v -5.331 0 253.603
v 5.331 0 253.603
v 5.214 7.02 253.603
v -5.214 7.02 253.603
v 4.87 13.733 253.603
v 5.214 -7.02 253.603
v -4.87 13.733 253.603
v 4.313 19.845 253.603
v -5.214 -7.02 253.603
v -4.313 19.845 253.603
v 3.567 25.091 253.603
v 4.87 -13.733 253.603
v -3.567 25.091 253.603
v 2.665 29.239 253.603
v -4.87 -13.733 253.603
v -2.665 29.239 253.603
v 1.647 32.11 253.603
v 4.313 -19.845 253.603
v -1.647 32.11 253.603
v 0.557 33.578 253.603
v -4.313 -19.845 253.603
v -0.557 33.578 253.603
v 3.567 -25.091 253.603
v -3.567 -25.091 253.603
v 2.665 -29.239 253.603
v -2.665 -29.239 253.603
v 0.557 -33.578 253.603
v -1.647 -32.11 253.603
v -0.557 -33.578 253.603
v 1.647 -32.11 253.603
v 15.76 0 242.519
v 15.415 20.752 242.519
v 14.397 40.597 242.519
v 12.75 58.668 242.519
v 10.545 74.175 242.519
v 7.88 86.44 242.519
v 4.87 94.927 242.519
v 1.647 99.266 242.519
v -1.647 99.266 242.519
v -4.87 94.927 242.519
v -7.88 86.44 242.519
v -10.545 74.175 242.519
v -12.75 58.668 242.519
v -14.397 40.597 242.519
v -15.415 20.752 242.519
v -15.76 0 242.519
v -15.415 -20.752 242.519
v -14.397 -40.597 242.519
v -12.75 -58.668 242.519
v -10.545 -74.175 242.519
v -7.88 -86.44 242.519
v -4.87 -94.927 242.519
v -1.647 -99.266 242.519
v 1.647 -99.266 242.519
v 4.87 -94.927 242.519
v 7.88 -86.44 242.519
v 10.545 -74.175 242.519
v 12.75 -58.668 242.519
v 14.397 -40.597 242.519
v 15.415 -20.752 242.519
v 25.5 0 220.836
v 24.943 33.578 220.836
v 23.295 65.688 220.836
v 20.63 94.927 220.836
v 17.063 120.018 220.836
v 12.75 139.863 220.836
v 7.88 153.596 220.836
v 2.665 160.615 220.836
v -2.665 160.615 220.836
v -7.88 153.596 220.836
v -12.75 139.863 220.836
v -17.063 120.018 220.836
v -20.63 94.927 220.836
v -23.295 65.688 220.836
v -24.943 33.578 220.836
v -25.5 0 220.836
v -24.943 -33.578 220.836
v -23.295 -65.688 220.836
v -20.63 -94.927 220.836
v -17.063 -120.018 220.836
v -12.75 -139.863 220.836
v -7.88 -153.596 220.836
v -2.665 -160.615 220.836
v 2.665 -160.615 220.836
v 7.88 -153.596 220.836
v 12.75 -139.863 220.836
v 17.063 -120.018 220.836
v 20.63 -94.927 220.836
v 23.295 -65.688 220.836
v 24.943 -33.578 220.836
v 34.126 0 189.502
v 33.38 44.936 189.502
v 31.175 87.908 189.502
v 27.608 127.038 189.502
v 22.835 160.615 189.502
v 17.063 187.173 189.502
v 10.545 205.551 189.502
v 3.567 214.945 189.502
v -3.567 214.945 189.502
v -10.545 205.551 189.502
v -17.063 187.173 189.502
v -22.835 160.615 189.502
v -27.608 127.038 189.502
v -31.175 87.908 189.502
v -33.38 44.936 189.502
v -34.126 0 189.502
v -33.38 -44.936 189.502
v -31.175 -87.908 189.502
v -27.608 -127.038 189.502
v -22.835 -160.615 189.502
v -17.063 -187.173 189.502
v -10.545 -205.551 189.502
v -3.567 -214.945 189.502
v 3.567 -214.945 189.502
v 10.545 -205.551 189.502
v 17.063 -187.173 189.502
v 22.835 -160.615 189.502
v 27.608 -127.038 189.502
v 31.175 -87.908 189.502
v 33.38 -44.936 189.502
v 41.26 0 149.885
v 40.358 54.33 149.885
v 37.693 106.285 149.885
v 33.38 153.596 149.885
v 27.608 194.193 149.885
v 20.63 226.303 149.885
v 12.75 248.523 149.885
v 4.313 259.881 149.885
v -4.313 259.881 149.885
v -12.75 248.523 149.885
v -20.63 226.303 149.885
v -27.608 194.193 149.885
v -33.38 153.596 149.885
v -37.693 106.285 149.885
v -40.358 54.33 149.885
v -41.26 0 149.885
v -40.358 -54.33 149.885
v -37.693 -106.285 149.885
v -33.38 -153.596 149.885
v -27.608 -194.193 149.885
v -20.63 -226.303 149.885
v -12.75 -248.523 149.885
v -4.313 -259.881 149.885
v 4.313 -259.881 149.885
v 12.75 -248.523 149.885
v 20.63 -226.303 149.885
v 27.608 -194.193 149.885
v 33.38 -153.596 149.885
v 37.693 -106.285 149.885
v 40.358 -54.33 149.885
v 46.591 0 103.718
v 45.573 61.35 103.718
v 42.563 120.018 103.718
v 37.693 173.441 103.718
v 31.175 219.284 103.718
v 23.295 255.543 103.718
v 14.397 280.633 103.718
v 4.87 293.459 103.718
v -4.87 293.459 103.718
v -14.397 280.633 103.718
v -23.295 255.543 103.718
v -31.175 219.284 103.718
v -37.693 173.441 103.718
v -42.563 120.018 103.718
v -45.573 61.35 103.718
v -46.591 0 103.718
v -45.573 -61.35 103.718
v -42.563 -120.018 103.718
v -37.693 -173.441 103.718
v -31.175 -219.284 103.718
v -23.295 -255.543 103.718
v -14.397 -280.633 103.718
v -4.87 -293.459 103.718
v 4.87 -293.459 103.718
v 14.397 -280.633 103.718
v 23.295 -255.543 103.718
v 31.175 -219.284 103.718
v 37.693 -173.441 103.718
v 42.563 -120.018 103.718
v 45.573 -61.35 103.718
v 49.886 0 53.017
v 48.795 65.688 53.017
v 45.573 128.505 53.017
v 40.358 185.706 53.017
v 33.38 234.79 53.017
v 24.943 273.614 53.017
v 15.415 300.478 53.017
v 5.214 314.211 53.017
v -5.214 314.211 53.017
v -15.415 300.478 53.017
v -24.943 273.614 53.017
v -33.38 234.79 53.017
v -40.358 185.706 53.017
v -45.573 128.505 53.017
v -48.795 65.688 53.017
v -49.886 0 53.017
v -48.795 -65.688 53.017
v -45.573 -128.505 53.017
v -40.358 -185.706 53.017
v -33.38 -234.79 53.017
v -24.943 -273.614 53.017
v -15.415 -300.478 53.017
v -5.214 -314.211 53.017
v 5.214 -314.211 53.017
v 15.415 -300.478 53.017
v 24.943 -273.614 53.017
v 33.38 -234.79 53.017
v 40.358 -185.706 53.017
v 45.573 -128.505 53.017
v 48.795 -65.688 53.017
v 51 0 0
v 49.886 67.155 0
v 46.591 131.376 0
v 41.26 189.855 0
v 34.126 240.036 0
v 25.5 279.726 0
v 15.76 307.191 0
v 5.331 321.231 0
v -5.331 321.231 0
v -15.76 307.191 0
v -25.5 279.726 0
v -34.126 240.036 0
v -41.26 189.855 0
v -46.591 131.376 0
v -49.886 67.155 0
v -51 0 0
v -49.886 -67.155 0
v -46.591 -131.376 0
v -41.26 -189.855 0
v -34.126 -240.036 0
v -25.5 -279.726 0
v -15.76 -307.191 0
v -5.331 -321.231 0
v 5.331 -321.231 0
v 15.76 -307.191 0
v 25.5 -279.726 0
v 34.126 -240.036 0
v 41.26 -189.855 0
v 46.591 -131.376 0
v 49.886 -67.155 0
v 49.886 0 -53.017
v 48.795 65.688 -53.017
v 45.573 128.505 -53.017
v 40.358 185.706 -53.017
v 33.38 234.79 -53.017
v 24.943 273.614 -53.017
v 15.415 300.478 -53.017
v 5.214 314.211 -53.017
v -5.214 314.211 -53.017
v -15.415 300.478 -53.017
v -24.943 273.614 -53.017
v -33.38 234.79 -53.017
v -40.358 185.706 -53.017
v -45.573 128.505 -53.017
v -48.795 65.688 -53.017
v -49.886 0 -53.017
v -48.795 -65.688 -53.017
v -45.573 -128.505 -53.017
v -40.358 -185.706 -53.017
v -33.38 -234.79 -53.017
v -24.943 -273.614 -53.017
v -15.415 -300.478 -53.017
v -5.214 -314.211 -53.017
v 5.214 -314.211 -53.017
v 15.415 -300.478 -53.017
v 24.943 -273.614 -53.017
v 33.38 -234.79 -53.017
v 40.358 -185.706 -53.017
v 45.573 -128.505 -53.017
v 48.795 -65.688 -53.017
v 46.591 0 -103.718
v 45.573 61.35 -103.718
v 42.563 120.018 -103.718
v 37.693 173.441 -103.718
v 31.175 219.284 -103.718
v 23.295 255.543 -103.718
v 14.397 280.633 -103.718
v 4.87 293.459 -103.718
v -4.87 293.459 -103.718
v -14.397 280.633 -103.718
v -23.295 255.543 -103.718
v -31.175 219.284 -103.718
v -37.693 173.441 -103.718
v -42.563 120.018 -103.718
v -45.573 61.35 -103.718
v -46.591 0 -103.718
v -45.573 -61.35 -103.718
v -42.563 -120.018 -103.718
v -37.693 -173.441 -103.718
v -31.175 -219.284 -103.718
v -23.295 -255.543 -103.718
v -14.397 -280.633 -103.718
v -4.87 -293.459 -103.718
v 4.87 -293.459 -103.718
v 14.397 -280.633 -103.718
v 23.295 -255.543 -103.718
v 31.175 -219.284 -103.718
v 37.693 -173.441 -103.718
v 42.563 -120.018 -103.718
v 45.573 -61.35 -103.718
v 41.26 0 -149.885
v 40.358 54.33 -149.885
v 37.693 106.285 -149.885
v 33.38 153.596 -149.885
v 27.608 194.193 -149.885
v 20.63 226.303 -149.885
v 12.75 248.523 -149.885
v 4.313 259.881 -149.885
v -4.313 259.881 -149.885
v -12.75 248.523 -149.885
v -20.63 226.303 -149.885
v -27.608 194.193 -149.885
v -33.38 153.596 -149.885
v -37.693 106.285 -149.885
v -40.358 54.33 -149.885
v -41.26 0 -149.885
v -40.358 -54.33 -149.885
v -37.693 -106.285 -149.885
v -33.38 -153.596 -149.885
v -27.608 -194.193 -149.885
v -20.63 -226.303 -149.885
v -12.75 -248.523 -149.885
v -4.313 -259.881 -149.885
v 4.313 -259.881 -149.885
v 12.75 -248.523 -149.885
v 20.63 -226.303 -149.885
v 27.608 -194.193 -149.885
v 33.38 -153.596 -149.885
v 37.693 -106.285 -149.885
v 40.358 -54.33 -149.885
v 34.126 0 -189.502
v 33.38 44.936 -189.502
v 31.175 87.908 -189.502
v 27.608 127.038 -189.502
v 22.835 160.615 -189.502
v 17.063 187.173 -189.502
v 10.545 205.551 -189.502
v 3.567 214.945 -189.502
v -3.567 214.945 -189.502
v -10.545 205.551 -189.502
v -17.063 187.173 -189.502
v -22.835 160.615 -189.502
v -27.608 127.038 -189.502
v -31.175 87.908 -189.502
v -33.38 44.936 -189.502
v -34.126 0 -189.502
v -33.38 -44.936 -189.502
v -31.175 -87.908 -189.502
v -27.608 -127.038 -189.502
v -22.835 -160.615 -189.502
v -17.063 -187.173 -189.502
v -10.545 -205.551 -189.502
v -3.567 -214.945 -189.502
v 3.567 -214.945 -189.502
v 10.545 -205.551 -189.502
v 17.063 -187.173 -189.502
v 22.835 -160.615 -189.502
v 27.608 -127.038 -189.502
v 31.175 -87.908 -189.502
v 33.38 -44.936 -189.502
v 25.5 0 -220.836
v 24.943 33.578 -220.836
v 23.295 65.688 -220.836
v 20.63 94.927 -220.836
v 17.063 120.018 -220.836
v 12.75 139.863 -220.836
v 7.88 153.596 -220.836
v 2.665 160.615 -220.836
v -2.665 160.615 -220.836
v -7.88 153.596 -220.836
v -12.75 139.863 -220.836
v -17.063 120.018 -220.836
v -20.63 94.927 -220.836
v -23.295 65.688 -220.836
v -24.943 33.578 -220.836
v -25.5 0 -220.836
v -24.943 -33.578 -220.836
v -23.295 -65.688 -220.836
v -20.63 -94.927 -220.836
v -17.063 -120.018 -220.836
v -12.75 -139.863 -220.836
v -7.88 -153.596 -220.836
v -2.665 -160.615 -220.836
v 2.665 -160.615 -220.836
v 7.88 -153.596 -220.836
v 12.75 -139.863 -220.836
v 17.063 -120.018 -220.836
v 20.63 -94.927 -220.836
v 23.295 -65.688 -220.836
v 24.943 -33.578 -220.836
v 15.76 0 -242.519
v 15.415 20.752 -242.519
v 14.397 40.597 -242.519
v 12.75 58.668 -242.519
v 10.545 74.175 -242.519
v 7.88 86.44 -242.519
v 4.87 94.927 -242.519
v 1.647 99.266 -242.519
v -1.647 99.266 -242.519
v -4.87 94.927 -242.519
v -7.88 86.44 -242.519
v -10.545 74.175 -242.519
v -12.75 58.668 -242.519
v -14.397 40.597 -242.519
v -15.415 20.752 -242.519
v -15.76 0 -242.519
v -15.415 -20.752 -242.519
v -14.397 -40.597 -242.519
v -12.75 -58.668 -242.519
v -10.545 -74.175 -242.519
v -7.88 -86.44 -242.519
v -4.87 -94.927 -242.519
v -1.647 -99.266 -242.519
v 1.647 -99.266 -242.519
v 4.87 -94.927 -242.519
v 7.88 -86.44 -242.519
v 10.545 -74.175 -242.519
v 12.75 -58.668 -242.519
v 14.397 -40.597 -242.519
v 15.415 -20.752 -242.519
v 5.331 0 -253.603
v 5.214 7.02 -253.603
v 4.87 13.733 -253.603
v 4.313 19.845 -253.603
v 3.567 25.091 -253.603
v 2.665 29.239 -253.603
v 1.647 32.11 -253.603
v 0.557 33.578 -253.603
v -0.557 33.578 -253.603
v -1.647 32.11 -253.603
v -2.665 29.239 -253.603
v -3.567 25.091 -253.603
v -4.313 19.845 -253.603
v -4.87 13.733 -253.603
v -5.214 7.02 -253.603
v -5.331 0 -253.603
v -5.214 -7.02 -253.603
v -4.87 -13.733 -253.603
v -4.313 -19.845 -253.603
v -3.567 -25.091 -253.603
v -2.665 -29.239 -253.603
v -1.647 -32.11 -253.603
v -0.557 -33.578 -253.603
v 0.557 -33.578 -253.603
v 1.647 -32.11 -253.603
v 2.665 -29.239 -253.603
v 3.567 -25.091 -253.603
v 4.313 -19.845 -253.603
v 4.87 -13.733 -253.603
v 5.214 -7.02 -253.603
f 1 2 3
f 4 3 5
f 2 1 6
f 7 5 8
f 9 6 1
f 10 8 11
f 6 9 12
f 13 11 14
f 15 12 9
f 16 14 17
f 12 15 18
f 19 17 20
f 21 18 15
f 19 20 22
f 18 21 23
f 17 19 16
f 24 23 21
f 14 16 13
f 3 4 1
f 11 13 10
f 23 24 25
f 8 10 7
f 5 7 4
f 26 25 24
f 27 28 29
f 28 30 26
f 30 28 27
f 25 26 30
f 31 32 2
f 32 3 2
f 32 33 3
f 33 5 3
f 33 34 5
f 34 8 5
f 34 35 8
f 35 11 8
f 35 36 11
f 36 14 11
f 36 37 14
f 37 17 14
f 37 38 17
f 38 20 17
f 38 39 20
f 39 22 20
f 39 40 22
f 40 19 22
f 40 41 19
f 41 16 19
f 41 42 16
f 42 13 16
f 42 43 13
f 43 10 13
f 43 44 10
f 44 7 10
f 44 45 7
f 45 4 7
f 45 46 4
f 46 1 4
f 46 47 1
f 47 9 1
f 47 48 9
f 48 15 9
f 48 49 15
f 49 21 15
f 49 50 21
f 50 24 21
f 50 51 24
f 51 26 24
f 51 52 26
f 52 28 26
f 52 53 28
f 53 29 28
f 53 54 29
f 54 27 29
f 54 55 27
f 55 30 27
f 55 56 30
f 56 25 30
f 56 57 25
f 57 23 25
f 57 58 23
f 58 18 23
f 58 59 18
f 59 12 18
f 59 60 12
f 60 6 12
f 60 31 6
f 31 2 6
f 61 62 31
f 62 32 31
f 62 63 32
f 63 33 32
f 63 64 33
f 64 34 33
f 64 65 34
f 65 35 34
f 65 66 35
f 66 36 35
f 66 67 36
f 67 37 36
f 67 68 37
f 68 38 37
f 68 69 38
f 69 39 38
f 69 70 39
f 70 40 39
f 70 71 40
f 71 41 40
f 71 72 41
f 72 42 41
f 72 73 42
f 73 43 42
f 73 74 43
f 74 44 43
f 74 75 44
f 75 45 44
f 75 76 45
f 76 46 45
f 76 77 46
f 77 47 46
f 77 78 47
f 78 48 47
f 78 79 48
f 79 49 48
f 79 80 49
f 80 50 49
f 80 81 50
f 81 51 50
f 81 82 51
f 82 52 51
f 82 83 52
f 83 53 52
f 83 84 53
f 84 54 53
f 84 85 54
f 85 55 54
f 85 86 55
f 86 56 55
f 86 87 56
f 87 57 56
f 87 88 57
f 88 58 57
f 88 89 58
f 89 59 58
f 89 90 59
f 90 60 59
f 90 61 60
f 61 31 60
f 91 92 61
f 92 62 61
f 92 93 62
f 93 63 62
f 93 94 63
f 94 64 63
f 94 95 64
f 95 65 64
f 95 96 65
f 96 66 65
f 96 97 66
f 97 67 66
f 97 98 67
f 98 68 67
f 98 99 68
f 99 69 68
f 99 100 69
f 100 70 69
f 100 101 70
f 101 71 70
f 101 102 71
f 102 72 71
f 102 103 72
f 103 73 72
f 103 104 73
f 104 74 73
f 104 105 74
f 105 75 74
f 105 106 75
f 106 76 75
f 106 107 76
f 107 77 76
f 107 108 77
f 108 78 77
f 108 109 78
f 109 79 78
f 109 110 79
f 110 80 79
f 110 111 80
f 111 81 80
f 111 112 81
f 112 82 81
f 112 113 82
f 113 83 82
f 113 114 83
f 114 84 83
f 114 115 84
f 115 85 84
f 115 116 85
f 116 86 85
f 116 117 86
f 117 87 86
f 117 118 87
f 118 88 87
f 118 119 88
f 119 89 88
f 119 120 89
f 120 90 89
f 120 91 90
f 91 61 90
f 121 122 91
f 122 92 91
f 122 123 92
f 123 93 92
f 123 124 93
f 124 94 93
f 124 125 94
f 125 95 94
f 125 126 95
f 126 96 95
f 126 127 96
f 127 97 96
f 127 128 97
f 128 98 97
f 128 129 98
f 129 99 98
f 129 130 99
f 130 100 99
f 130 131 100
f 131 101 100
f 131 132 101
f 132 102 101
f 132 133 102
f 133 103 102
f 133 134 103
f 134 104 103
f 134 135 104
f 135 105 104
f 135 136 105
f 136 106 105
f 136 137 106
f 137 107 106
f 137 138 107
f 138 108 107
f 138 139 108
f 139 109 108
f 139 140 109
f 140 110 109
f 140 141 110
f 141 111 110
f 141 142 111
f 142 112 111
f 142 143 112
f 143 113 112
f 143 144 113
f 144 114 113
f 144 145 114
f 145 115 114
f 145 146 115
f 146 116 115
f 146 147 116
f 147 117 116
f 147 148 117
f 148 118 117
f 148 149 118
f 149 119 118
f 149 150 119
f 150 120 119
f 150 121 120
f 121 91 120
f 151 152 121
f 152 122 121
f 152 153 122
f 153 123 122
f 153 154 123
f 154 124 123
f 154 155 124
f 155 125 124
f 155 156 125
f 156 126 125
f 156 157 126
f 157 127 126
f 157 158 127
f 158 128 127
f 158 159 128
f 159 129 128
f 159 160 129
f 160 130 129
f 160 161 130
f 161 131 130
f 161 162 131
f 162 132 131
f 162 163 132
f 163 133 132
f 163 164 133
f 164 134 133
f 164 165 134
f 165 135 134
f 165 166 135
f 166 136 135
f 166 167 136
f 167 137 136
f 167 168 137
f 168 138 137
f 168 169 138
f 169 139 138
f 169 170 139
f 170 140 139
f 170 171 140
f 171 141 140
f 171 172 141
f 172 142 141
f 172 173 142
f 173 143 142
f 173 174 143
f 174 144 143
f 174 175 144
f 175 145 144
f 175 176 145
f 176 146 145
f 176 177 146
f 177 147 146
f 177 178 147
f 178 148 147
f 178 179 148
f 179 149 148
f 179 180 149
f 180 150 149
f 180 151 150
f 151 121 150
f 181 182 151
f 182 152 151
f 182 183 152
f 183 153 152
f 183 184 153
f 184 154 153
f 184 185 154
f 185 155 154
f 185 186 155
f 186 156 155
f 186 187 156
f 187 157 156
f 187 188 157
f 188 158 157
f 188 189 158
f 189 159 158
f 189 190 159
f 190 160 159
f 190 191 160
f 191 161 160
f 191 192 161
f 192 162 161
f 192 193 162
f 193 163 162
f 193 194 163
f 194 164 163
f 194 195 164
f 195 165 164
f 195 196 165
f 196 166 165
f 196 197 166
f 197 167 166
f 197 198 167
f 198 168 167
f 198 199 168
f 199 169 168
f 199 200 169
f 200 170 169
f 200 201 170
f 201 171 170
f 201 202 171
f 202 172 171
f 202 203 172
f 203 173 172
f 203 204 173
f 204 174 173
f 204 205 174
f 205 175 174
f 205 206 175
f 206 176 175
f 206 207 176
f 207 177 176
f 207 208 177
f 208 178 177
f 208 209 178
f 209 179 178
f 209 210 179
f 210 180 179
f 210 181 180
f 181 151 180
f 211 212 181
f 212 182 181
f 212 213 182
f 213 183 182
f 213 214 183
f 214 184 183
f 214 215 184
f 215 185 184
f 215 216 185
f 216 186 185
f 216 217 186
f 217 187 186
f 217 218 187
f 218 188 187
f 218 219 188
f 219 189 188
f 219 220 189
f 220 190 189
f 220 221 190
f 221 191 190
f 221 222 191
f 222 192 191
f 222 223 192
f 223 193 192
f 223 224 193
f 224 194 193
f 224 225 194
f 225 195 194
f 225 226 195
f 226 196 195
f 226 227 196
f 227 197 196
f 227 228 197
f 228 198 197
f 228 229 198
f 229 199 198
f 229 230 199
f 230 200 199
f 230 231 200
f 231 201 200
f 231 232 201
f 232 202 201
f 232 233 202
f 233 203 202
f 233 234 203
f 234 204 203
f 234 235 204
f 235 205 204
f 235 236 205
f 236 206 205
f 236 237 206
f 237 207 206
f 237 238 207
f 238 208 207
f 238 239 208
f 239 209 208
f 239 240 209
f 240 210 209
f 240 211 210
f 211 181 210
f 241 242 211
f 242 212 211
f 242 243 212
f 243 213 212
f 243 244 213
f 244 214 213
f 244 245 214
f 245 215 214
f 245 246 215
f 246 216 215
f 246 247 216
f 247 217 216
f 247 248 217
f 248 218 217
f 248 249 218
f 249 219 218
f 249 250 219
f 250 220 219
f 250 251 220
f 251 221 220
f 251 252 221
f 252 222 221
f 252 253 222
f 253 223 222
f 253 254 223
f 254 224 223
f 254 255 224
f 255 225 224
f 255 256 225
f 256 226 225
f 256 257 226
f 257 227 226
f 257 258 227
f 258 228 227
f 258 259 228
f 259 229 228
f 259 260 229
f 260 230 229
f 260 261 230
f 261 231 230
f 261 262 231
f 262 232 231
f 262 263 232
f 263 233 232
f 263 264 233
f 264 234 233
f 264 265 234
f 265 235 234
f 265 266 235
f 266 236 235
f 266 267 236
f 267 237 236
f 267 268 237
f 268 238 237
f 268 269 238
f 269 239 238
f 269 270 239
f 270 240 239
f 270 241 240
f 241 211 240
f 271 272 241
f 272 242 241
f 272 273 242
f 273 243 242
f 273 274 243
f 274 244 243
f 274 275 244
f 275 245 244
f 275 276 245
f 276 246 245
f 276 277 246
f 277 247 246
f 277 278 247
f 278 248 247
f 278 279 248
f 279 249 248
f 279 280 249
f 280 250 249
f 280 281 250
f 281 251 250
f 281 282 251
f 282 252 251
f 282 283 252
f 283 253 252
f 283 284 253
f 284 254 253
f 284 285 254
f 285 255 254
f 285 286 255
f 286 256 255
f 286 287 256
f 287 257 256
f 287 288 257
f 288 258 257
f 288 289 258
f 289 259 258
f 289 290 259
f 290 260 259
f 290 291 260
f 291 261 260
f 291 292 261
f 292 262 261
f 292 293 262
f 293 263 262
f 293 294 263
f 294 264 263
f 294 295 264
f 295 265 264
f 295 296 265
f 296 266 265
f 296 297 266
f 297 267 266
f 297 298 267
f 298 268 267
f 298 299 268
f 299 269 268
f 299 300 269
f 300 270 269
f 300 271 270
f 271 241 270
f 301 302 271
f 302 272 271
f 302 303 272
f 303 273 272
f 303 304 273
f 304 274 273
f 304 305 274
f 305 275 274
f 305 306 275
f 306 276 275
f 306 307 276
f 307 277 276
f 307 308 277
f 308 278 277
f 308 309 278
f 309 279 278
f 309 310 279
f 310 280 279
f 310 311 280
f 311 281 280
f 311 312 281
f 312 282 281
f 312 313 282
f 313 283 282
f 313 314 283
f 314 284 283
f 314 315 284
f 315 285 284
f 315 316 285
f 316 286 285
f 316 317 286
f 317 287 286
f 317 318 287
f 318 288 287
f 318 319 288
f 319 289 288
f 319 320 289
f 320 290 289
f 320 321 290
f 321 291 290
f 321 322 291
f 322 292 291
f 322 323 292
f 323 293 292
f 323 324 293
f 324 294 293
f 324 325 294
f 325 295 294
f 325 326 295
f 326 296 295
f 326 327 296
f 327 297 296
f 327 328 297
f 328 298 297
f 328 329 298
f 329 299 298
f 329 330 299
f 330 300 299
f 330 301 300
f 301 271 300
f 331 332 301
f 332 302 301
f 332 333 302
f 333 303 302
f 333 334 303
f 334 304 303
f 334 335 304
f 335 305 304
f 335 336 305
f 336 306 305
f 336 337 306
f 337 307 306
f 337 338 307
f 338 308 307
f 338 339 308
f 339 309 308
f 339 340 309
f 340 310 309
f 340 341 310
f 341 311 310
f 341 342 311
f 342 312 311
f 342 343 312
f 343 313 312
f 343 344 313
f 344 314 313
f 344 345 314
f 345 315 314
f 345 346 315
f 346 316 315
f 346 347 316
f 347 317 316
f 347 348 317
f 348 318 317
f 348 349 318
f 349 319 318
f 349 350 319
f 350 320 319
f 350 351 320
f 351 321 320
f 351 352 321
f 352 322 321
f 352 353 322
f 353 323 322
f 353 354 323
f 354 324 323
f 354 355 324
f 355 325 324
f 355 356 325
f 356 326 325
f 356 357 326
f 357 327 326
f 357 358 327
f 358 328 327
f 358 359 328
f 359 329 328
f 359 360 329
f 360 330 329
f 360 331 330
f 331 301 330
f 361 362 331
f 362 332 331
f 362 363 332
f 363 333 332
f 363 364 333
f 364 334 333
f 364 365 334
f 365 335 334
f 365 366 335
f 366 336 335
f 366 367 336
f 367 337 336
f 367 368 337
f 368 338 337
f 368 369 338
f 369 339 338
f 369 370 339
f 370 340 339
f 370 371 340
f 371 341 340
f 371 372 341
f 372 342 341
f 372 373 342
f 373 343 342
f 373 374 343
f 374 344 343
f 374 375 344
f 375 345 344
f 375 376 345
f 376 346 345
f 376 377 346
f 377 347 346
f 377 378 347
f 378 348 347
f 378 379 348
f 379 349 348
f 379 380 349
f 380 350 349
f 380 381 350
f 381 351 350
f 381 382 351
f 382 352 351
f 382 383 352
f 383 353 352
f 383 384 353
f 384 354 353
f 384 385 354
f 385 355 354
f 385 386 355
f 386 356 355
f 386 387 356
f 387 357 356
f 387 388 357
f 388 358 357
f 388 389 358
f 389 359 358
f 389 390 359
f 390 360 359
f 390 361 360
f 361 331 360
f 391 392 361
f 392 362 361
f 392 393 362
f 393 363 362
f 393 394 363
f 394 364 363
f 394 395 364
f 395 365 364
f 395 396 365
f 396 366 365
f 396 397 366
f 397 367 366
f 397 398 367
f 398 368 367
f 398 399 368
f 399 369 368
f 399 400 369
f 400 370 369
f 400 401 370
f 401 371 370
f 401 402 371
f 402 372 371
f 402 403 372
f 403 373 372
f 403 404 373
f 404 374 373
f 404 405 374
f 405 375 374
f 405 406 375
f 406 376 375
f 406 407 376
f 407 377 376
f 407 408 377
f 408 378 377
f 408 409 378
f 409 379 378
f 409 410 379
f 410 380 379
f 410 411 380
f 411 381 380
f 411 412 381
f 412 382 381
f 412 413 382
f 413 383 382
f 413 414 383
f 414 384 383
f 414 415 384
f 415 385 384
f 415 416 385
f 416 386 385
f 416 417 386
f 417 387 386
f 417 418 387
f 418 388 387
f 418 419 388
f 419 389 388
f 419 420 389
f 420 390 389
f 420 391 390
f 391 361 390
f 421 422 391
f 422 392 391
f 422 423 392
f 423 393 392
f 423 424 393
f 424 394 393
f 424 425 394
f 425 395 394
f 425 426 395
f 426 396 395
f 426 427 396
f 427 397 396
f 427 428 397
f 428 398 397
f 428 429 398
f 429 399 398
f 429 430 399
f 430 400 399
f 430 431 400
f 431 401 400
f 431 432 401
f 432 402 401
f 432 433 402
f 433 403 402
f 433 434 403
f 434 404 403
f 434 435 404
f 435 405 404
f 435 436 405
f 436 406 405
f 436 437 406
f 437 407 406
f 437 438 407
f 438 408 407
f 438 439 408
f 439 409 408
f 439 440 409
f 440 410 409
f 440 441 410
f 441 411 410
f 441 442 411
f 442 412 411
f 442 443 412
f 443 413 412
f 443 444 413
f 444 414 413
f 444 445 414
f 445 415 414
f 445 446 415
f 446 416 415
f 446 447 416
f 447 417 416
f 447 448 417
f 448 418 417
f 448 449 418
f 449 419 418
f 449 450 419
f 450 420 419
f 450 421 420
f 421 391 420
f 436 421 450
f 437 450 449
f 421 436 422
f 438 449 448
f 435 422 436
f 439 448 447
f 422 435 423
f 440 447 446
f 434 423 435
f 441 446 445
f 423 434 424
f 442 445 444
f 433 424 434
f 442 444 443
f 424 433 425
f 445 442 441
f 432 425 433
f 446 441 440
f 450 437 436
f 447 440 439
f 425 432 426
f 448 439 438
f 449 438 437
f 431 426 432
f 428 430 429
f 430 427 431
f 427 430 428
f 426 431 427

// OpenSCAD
// Generated by SolidPython 1.0.1 on 2020-07-29 00:46:46


scale(v = [3, 19, 15]) {
	sphere(r = 17);
}
/***********************************************
*********      SolidPython code:      **********
************************************************
 
# import packages: SolidPython
from solid import *
from solid.utils import *
from itertools import chain, combinations, permutations


class Resize:

    def __init__(self, scad_file):
        self.scad_file = scad_file
        #self.scad_file = import_scad(scad_file)
        # cone/cylinder param:
        self.r1 = 0
        self.r2 = 0
        self.h = 0
        # rectangular prism param:
        self.w = 0
        self.l = 0
        # ellipse param:
        self.r = 0

    # import OpenScad code (file name corresponds to shape)


    # classify shape + parameters
    def assign(self, param1, param2, param3):
        if self.scad_file == 'cone.scad':
            self.r1 = param1
            self.r2 = param2
            self.h = param3
        elif self.scad_file == 'cylinder.scad':
            self.r1 = param1
            self.r2 = param2
            self.h = param3
        elif self.scad_file == 'rectangularPrism.scad':
            self.h = param1
            self.l = param2
            self.w = param3
        else:
            self.r = param1
            self.h = param2

    # resize parameters
    def iterate(self):
        x = range(3, 20, 2)
        i = 1
        if self.scad_file == 'cone.scad':
            tempList = list(permutations(x, 2))
            for temp in tempList:
                param1 = temp[0]
                param2 = temp[1]
                filepath = 'produced_scad_files/' + 'cone' + str(param1) + '_' + str(param2) + '_' + '.scad'
                scad_render_to_file(cylinder(h=param1, r1=param2, r2=0), filepath)

        elif self.scad_file == 'cylinder.scad':
            tempList = list(permutations(x, 3))
            for temp in tempList:
                param1 = temp[0]
                param2 = temp[1]
                filepath = 'produced_scad_files/' + 'cylinder' + str(param1) + '_' + str(param2) + '_' + '.scad'
                scad_render_to_file(cylinder(h=param1, r1=param2, r2=param2), filepath)

        elif self.scad_file == 'rectangularPrism.scad':
            tempList = list(permutations(x, 3))
            for temp in tempList:
                param1 = temp[0]
                param2 = temp[1]
                param3 = temp[2]
                filepath = 'produced_scad_files/' + 'rectangularPrism' + str(param1) + '_' + str(param2) + '_' + str(
                    param3) + '.scad'
                scad_render_to_file(cube(size=(param1, param2, param3)), filepath)

        elif self.scad_file == 'ellipse.scad':
            tempList = list(permutations(x, 4))
            for temp in tempList:
                param1 = temp[0]
                param2 = temp[1]
                param3 = temp[2]
                param4 = temp[3]
                filepath = 'produced_scad_files/' + 'ellipse' + str(param1) + '_' + str(param2) + '_' + str(param3) + '_' + str(param4) + '.scad'
                scad_render_to_file(scale([param1, param2, param3])(sphere(r=param4)), filepath)

    def render_to_scadfile(self):
        scad_render_to_file(scad, 'example.scad') 
 
************************************************/
